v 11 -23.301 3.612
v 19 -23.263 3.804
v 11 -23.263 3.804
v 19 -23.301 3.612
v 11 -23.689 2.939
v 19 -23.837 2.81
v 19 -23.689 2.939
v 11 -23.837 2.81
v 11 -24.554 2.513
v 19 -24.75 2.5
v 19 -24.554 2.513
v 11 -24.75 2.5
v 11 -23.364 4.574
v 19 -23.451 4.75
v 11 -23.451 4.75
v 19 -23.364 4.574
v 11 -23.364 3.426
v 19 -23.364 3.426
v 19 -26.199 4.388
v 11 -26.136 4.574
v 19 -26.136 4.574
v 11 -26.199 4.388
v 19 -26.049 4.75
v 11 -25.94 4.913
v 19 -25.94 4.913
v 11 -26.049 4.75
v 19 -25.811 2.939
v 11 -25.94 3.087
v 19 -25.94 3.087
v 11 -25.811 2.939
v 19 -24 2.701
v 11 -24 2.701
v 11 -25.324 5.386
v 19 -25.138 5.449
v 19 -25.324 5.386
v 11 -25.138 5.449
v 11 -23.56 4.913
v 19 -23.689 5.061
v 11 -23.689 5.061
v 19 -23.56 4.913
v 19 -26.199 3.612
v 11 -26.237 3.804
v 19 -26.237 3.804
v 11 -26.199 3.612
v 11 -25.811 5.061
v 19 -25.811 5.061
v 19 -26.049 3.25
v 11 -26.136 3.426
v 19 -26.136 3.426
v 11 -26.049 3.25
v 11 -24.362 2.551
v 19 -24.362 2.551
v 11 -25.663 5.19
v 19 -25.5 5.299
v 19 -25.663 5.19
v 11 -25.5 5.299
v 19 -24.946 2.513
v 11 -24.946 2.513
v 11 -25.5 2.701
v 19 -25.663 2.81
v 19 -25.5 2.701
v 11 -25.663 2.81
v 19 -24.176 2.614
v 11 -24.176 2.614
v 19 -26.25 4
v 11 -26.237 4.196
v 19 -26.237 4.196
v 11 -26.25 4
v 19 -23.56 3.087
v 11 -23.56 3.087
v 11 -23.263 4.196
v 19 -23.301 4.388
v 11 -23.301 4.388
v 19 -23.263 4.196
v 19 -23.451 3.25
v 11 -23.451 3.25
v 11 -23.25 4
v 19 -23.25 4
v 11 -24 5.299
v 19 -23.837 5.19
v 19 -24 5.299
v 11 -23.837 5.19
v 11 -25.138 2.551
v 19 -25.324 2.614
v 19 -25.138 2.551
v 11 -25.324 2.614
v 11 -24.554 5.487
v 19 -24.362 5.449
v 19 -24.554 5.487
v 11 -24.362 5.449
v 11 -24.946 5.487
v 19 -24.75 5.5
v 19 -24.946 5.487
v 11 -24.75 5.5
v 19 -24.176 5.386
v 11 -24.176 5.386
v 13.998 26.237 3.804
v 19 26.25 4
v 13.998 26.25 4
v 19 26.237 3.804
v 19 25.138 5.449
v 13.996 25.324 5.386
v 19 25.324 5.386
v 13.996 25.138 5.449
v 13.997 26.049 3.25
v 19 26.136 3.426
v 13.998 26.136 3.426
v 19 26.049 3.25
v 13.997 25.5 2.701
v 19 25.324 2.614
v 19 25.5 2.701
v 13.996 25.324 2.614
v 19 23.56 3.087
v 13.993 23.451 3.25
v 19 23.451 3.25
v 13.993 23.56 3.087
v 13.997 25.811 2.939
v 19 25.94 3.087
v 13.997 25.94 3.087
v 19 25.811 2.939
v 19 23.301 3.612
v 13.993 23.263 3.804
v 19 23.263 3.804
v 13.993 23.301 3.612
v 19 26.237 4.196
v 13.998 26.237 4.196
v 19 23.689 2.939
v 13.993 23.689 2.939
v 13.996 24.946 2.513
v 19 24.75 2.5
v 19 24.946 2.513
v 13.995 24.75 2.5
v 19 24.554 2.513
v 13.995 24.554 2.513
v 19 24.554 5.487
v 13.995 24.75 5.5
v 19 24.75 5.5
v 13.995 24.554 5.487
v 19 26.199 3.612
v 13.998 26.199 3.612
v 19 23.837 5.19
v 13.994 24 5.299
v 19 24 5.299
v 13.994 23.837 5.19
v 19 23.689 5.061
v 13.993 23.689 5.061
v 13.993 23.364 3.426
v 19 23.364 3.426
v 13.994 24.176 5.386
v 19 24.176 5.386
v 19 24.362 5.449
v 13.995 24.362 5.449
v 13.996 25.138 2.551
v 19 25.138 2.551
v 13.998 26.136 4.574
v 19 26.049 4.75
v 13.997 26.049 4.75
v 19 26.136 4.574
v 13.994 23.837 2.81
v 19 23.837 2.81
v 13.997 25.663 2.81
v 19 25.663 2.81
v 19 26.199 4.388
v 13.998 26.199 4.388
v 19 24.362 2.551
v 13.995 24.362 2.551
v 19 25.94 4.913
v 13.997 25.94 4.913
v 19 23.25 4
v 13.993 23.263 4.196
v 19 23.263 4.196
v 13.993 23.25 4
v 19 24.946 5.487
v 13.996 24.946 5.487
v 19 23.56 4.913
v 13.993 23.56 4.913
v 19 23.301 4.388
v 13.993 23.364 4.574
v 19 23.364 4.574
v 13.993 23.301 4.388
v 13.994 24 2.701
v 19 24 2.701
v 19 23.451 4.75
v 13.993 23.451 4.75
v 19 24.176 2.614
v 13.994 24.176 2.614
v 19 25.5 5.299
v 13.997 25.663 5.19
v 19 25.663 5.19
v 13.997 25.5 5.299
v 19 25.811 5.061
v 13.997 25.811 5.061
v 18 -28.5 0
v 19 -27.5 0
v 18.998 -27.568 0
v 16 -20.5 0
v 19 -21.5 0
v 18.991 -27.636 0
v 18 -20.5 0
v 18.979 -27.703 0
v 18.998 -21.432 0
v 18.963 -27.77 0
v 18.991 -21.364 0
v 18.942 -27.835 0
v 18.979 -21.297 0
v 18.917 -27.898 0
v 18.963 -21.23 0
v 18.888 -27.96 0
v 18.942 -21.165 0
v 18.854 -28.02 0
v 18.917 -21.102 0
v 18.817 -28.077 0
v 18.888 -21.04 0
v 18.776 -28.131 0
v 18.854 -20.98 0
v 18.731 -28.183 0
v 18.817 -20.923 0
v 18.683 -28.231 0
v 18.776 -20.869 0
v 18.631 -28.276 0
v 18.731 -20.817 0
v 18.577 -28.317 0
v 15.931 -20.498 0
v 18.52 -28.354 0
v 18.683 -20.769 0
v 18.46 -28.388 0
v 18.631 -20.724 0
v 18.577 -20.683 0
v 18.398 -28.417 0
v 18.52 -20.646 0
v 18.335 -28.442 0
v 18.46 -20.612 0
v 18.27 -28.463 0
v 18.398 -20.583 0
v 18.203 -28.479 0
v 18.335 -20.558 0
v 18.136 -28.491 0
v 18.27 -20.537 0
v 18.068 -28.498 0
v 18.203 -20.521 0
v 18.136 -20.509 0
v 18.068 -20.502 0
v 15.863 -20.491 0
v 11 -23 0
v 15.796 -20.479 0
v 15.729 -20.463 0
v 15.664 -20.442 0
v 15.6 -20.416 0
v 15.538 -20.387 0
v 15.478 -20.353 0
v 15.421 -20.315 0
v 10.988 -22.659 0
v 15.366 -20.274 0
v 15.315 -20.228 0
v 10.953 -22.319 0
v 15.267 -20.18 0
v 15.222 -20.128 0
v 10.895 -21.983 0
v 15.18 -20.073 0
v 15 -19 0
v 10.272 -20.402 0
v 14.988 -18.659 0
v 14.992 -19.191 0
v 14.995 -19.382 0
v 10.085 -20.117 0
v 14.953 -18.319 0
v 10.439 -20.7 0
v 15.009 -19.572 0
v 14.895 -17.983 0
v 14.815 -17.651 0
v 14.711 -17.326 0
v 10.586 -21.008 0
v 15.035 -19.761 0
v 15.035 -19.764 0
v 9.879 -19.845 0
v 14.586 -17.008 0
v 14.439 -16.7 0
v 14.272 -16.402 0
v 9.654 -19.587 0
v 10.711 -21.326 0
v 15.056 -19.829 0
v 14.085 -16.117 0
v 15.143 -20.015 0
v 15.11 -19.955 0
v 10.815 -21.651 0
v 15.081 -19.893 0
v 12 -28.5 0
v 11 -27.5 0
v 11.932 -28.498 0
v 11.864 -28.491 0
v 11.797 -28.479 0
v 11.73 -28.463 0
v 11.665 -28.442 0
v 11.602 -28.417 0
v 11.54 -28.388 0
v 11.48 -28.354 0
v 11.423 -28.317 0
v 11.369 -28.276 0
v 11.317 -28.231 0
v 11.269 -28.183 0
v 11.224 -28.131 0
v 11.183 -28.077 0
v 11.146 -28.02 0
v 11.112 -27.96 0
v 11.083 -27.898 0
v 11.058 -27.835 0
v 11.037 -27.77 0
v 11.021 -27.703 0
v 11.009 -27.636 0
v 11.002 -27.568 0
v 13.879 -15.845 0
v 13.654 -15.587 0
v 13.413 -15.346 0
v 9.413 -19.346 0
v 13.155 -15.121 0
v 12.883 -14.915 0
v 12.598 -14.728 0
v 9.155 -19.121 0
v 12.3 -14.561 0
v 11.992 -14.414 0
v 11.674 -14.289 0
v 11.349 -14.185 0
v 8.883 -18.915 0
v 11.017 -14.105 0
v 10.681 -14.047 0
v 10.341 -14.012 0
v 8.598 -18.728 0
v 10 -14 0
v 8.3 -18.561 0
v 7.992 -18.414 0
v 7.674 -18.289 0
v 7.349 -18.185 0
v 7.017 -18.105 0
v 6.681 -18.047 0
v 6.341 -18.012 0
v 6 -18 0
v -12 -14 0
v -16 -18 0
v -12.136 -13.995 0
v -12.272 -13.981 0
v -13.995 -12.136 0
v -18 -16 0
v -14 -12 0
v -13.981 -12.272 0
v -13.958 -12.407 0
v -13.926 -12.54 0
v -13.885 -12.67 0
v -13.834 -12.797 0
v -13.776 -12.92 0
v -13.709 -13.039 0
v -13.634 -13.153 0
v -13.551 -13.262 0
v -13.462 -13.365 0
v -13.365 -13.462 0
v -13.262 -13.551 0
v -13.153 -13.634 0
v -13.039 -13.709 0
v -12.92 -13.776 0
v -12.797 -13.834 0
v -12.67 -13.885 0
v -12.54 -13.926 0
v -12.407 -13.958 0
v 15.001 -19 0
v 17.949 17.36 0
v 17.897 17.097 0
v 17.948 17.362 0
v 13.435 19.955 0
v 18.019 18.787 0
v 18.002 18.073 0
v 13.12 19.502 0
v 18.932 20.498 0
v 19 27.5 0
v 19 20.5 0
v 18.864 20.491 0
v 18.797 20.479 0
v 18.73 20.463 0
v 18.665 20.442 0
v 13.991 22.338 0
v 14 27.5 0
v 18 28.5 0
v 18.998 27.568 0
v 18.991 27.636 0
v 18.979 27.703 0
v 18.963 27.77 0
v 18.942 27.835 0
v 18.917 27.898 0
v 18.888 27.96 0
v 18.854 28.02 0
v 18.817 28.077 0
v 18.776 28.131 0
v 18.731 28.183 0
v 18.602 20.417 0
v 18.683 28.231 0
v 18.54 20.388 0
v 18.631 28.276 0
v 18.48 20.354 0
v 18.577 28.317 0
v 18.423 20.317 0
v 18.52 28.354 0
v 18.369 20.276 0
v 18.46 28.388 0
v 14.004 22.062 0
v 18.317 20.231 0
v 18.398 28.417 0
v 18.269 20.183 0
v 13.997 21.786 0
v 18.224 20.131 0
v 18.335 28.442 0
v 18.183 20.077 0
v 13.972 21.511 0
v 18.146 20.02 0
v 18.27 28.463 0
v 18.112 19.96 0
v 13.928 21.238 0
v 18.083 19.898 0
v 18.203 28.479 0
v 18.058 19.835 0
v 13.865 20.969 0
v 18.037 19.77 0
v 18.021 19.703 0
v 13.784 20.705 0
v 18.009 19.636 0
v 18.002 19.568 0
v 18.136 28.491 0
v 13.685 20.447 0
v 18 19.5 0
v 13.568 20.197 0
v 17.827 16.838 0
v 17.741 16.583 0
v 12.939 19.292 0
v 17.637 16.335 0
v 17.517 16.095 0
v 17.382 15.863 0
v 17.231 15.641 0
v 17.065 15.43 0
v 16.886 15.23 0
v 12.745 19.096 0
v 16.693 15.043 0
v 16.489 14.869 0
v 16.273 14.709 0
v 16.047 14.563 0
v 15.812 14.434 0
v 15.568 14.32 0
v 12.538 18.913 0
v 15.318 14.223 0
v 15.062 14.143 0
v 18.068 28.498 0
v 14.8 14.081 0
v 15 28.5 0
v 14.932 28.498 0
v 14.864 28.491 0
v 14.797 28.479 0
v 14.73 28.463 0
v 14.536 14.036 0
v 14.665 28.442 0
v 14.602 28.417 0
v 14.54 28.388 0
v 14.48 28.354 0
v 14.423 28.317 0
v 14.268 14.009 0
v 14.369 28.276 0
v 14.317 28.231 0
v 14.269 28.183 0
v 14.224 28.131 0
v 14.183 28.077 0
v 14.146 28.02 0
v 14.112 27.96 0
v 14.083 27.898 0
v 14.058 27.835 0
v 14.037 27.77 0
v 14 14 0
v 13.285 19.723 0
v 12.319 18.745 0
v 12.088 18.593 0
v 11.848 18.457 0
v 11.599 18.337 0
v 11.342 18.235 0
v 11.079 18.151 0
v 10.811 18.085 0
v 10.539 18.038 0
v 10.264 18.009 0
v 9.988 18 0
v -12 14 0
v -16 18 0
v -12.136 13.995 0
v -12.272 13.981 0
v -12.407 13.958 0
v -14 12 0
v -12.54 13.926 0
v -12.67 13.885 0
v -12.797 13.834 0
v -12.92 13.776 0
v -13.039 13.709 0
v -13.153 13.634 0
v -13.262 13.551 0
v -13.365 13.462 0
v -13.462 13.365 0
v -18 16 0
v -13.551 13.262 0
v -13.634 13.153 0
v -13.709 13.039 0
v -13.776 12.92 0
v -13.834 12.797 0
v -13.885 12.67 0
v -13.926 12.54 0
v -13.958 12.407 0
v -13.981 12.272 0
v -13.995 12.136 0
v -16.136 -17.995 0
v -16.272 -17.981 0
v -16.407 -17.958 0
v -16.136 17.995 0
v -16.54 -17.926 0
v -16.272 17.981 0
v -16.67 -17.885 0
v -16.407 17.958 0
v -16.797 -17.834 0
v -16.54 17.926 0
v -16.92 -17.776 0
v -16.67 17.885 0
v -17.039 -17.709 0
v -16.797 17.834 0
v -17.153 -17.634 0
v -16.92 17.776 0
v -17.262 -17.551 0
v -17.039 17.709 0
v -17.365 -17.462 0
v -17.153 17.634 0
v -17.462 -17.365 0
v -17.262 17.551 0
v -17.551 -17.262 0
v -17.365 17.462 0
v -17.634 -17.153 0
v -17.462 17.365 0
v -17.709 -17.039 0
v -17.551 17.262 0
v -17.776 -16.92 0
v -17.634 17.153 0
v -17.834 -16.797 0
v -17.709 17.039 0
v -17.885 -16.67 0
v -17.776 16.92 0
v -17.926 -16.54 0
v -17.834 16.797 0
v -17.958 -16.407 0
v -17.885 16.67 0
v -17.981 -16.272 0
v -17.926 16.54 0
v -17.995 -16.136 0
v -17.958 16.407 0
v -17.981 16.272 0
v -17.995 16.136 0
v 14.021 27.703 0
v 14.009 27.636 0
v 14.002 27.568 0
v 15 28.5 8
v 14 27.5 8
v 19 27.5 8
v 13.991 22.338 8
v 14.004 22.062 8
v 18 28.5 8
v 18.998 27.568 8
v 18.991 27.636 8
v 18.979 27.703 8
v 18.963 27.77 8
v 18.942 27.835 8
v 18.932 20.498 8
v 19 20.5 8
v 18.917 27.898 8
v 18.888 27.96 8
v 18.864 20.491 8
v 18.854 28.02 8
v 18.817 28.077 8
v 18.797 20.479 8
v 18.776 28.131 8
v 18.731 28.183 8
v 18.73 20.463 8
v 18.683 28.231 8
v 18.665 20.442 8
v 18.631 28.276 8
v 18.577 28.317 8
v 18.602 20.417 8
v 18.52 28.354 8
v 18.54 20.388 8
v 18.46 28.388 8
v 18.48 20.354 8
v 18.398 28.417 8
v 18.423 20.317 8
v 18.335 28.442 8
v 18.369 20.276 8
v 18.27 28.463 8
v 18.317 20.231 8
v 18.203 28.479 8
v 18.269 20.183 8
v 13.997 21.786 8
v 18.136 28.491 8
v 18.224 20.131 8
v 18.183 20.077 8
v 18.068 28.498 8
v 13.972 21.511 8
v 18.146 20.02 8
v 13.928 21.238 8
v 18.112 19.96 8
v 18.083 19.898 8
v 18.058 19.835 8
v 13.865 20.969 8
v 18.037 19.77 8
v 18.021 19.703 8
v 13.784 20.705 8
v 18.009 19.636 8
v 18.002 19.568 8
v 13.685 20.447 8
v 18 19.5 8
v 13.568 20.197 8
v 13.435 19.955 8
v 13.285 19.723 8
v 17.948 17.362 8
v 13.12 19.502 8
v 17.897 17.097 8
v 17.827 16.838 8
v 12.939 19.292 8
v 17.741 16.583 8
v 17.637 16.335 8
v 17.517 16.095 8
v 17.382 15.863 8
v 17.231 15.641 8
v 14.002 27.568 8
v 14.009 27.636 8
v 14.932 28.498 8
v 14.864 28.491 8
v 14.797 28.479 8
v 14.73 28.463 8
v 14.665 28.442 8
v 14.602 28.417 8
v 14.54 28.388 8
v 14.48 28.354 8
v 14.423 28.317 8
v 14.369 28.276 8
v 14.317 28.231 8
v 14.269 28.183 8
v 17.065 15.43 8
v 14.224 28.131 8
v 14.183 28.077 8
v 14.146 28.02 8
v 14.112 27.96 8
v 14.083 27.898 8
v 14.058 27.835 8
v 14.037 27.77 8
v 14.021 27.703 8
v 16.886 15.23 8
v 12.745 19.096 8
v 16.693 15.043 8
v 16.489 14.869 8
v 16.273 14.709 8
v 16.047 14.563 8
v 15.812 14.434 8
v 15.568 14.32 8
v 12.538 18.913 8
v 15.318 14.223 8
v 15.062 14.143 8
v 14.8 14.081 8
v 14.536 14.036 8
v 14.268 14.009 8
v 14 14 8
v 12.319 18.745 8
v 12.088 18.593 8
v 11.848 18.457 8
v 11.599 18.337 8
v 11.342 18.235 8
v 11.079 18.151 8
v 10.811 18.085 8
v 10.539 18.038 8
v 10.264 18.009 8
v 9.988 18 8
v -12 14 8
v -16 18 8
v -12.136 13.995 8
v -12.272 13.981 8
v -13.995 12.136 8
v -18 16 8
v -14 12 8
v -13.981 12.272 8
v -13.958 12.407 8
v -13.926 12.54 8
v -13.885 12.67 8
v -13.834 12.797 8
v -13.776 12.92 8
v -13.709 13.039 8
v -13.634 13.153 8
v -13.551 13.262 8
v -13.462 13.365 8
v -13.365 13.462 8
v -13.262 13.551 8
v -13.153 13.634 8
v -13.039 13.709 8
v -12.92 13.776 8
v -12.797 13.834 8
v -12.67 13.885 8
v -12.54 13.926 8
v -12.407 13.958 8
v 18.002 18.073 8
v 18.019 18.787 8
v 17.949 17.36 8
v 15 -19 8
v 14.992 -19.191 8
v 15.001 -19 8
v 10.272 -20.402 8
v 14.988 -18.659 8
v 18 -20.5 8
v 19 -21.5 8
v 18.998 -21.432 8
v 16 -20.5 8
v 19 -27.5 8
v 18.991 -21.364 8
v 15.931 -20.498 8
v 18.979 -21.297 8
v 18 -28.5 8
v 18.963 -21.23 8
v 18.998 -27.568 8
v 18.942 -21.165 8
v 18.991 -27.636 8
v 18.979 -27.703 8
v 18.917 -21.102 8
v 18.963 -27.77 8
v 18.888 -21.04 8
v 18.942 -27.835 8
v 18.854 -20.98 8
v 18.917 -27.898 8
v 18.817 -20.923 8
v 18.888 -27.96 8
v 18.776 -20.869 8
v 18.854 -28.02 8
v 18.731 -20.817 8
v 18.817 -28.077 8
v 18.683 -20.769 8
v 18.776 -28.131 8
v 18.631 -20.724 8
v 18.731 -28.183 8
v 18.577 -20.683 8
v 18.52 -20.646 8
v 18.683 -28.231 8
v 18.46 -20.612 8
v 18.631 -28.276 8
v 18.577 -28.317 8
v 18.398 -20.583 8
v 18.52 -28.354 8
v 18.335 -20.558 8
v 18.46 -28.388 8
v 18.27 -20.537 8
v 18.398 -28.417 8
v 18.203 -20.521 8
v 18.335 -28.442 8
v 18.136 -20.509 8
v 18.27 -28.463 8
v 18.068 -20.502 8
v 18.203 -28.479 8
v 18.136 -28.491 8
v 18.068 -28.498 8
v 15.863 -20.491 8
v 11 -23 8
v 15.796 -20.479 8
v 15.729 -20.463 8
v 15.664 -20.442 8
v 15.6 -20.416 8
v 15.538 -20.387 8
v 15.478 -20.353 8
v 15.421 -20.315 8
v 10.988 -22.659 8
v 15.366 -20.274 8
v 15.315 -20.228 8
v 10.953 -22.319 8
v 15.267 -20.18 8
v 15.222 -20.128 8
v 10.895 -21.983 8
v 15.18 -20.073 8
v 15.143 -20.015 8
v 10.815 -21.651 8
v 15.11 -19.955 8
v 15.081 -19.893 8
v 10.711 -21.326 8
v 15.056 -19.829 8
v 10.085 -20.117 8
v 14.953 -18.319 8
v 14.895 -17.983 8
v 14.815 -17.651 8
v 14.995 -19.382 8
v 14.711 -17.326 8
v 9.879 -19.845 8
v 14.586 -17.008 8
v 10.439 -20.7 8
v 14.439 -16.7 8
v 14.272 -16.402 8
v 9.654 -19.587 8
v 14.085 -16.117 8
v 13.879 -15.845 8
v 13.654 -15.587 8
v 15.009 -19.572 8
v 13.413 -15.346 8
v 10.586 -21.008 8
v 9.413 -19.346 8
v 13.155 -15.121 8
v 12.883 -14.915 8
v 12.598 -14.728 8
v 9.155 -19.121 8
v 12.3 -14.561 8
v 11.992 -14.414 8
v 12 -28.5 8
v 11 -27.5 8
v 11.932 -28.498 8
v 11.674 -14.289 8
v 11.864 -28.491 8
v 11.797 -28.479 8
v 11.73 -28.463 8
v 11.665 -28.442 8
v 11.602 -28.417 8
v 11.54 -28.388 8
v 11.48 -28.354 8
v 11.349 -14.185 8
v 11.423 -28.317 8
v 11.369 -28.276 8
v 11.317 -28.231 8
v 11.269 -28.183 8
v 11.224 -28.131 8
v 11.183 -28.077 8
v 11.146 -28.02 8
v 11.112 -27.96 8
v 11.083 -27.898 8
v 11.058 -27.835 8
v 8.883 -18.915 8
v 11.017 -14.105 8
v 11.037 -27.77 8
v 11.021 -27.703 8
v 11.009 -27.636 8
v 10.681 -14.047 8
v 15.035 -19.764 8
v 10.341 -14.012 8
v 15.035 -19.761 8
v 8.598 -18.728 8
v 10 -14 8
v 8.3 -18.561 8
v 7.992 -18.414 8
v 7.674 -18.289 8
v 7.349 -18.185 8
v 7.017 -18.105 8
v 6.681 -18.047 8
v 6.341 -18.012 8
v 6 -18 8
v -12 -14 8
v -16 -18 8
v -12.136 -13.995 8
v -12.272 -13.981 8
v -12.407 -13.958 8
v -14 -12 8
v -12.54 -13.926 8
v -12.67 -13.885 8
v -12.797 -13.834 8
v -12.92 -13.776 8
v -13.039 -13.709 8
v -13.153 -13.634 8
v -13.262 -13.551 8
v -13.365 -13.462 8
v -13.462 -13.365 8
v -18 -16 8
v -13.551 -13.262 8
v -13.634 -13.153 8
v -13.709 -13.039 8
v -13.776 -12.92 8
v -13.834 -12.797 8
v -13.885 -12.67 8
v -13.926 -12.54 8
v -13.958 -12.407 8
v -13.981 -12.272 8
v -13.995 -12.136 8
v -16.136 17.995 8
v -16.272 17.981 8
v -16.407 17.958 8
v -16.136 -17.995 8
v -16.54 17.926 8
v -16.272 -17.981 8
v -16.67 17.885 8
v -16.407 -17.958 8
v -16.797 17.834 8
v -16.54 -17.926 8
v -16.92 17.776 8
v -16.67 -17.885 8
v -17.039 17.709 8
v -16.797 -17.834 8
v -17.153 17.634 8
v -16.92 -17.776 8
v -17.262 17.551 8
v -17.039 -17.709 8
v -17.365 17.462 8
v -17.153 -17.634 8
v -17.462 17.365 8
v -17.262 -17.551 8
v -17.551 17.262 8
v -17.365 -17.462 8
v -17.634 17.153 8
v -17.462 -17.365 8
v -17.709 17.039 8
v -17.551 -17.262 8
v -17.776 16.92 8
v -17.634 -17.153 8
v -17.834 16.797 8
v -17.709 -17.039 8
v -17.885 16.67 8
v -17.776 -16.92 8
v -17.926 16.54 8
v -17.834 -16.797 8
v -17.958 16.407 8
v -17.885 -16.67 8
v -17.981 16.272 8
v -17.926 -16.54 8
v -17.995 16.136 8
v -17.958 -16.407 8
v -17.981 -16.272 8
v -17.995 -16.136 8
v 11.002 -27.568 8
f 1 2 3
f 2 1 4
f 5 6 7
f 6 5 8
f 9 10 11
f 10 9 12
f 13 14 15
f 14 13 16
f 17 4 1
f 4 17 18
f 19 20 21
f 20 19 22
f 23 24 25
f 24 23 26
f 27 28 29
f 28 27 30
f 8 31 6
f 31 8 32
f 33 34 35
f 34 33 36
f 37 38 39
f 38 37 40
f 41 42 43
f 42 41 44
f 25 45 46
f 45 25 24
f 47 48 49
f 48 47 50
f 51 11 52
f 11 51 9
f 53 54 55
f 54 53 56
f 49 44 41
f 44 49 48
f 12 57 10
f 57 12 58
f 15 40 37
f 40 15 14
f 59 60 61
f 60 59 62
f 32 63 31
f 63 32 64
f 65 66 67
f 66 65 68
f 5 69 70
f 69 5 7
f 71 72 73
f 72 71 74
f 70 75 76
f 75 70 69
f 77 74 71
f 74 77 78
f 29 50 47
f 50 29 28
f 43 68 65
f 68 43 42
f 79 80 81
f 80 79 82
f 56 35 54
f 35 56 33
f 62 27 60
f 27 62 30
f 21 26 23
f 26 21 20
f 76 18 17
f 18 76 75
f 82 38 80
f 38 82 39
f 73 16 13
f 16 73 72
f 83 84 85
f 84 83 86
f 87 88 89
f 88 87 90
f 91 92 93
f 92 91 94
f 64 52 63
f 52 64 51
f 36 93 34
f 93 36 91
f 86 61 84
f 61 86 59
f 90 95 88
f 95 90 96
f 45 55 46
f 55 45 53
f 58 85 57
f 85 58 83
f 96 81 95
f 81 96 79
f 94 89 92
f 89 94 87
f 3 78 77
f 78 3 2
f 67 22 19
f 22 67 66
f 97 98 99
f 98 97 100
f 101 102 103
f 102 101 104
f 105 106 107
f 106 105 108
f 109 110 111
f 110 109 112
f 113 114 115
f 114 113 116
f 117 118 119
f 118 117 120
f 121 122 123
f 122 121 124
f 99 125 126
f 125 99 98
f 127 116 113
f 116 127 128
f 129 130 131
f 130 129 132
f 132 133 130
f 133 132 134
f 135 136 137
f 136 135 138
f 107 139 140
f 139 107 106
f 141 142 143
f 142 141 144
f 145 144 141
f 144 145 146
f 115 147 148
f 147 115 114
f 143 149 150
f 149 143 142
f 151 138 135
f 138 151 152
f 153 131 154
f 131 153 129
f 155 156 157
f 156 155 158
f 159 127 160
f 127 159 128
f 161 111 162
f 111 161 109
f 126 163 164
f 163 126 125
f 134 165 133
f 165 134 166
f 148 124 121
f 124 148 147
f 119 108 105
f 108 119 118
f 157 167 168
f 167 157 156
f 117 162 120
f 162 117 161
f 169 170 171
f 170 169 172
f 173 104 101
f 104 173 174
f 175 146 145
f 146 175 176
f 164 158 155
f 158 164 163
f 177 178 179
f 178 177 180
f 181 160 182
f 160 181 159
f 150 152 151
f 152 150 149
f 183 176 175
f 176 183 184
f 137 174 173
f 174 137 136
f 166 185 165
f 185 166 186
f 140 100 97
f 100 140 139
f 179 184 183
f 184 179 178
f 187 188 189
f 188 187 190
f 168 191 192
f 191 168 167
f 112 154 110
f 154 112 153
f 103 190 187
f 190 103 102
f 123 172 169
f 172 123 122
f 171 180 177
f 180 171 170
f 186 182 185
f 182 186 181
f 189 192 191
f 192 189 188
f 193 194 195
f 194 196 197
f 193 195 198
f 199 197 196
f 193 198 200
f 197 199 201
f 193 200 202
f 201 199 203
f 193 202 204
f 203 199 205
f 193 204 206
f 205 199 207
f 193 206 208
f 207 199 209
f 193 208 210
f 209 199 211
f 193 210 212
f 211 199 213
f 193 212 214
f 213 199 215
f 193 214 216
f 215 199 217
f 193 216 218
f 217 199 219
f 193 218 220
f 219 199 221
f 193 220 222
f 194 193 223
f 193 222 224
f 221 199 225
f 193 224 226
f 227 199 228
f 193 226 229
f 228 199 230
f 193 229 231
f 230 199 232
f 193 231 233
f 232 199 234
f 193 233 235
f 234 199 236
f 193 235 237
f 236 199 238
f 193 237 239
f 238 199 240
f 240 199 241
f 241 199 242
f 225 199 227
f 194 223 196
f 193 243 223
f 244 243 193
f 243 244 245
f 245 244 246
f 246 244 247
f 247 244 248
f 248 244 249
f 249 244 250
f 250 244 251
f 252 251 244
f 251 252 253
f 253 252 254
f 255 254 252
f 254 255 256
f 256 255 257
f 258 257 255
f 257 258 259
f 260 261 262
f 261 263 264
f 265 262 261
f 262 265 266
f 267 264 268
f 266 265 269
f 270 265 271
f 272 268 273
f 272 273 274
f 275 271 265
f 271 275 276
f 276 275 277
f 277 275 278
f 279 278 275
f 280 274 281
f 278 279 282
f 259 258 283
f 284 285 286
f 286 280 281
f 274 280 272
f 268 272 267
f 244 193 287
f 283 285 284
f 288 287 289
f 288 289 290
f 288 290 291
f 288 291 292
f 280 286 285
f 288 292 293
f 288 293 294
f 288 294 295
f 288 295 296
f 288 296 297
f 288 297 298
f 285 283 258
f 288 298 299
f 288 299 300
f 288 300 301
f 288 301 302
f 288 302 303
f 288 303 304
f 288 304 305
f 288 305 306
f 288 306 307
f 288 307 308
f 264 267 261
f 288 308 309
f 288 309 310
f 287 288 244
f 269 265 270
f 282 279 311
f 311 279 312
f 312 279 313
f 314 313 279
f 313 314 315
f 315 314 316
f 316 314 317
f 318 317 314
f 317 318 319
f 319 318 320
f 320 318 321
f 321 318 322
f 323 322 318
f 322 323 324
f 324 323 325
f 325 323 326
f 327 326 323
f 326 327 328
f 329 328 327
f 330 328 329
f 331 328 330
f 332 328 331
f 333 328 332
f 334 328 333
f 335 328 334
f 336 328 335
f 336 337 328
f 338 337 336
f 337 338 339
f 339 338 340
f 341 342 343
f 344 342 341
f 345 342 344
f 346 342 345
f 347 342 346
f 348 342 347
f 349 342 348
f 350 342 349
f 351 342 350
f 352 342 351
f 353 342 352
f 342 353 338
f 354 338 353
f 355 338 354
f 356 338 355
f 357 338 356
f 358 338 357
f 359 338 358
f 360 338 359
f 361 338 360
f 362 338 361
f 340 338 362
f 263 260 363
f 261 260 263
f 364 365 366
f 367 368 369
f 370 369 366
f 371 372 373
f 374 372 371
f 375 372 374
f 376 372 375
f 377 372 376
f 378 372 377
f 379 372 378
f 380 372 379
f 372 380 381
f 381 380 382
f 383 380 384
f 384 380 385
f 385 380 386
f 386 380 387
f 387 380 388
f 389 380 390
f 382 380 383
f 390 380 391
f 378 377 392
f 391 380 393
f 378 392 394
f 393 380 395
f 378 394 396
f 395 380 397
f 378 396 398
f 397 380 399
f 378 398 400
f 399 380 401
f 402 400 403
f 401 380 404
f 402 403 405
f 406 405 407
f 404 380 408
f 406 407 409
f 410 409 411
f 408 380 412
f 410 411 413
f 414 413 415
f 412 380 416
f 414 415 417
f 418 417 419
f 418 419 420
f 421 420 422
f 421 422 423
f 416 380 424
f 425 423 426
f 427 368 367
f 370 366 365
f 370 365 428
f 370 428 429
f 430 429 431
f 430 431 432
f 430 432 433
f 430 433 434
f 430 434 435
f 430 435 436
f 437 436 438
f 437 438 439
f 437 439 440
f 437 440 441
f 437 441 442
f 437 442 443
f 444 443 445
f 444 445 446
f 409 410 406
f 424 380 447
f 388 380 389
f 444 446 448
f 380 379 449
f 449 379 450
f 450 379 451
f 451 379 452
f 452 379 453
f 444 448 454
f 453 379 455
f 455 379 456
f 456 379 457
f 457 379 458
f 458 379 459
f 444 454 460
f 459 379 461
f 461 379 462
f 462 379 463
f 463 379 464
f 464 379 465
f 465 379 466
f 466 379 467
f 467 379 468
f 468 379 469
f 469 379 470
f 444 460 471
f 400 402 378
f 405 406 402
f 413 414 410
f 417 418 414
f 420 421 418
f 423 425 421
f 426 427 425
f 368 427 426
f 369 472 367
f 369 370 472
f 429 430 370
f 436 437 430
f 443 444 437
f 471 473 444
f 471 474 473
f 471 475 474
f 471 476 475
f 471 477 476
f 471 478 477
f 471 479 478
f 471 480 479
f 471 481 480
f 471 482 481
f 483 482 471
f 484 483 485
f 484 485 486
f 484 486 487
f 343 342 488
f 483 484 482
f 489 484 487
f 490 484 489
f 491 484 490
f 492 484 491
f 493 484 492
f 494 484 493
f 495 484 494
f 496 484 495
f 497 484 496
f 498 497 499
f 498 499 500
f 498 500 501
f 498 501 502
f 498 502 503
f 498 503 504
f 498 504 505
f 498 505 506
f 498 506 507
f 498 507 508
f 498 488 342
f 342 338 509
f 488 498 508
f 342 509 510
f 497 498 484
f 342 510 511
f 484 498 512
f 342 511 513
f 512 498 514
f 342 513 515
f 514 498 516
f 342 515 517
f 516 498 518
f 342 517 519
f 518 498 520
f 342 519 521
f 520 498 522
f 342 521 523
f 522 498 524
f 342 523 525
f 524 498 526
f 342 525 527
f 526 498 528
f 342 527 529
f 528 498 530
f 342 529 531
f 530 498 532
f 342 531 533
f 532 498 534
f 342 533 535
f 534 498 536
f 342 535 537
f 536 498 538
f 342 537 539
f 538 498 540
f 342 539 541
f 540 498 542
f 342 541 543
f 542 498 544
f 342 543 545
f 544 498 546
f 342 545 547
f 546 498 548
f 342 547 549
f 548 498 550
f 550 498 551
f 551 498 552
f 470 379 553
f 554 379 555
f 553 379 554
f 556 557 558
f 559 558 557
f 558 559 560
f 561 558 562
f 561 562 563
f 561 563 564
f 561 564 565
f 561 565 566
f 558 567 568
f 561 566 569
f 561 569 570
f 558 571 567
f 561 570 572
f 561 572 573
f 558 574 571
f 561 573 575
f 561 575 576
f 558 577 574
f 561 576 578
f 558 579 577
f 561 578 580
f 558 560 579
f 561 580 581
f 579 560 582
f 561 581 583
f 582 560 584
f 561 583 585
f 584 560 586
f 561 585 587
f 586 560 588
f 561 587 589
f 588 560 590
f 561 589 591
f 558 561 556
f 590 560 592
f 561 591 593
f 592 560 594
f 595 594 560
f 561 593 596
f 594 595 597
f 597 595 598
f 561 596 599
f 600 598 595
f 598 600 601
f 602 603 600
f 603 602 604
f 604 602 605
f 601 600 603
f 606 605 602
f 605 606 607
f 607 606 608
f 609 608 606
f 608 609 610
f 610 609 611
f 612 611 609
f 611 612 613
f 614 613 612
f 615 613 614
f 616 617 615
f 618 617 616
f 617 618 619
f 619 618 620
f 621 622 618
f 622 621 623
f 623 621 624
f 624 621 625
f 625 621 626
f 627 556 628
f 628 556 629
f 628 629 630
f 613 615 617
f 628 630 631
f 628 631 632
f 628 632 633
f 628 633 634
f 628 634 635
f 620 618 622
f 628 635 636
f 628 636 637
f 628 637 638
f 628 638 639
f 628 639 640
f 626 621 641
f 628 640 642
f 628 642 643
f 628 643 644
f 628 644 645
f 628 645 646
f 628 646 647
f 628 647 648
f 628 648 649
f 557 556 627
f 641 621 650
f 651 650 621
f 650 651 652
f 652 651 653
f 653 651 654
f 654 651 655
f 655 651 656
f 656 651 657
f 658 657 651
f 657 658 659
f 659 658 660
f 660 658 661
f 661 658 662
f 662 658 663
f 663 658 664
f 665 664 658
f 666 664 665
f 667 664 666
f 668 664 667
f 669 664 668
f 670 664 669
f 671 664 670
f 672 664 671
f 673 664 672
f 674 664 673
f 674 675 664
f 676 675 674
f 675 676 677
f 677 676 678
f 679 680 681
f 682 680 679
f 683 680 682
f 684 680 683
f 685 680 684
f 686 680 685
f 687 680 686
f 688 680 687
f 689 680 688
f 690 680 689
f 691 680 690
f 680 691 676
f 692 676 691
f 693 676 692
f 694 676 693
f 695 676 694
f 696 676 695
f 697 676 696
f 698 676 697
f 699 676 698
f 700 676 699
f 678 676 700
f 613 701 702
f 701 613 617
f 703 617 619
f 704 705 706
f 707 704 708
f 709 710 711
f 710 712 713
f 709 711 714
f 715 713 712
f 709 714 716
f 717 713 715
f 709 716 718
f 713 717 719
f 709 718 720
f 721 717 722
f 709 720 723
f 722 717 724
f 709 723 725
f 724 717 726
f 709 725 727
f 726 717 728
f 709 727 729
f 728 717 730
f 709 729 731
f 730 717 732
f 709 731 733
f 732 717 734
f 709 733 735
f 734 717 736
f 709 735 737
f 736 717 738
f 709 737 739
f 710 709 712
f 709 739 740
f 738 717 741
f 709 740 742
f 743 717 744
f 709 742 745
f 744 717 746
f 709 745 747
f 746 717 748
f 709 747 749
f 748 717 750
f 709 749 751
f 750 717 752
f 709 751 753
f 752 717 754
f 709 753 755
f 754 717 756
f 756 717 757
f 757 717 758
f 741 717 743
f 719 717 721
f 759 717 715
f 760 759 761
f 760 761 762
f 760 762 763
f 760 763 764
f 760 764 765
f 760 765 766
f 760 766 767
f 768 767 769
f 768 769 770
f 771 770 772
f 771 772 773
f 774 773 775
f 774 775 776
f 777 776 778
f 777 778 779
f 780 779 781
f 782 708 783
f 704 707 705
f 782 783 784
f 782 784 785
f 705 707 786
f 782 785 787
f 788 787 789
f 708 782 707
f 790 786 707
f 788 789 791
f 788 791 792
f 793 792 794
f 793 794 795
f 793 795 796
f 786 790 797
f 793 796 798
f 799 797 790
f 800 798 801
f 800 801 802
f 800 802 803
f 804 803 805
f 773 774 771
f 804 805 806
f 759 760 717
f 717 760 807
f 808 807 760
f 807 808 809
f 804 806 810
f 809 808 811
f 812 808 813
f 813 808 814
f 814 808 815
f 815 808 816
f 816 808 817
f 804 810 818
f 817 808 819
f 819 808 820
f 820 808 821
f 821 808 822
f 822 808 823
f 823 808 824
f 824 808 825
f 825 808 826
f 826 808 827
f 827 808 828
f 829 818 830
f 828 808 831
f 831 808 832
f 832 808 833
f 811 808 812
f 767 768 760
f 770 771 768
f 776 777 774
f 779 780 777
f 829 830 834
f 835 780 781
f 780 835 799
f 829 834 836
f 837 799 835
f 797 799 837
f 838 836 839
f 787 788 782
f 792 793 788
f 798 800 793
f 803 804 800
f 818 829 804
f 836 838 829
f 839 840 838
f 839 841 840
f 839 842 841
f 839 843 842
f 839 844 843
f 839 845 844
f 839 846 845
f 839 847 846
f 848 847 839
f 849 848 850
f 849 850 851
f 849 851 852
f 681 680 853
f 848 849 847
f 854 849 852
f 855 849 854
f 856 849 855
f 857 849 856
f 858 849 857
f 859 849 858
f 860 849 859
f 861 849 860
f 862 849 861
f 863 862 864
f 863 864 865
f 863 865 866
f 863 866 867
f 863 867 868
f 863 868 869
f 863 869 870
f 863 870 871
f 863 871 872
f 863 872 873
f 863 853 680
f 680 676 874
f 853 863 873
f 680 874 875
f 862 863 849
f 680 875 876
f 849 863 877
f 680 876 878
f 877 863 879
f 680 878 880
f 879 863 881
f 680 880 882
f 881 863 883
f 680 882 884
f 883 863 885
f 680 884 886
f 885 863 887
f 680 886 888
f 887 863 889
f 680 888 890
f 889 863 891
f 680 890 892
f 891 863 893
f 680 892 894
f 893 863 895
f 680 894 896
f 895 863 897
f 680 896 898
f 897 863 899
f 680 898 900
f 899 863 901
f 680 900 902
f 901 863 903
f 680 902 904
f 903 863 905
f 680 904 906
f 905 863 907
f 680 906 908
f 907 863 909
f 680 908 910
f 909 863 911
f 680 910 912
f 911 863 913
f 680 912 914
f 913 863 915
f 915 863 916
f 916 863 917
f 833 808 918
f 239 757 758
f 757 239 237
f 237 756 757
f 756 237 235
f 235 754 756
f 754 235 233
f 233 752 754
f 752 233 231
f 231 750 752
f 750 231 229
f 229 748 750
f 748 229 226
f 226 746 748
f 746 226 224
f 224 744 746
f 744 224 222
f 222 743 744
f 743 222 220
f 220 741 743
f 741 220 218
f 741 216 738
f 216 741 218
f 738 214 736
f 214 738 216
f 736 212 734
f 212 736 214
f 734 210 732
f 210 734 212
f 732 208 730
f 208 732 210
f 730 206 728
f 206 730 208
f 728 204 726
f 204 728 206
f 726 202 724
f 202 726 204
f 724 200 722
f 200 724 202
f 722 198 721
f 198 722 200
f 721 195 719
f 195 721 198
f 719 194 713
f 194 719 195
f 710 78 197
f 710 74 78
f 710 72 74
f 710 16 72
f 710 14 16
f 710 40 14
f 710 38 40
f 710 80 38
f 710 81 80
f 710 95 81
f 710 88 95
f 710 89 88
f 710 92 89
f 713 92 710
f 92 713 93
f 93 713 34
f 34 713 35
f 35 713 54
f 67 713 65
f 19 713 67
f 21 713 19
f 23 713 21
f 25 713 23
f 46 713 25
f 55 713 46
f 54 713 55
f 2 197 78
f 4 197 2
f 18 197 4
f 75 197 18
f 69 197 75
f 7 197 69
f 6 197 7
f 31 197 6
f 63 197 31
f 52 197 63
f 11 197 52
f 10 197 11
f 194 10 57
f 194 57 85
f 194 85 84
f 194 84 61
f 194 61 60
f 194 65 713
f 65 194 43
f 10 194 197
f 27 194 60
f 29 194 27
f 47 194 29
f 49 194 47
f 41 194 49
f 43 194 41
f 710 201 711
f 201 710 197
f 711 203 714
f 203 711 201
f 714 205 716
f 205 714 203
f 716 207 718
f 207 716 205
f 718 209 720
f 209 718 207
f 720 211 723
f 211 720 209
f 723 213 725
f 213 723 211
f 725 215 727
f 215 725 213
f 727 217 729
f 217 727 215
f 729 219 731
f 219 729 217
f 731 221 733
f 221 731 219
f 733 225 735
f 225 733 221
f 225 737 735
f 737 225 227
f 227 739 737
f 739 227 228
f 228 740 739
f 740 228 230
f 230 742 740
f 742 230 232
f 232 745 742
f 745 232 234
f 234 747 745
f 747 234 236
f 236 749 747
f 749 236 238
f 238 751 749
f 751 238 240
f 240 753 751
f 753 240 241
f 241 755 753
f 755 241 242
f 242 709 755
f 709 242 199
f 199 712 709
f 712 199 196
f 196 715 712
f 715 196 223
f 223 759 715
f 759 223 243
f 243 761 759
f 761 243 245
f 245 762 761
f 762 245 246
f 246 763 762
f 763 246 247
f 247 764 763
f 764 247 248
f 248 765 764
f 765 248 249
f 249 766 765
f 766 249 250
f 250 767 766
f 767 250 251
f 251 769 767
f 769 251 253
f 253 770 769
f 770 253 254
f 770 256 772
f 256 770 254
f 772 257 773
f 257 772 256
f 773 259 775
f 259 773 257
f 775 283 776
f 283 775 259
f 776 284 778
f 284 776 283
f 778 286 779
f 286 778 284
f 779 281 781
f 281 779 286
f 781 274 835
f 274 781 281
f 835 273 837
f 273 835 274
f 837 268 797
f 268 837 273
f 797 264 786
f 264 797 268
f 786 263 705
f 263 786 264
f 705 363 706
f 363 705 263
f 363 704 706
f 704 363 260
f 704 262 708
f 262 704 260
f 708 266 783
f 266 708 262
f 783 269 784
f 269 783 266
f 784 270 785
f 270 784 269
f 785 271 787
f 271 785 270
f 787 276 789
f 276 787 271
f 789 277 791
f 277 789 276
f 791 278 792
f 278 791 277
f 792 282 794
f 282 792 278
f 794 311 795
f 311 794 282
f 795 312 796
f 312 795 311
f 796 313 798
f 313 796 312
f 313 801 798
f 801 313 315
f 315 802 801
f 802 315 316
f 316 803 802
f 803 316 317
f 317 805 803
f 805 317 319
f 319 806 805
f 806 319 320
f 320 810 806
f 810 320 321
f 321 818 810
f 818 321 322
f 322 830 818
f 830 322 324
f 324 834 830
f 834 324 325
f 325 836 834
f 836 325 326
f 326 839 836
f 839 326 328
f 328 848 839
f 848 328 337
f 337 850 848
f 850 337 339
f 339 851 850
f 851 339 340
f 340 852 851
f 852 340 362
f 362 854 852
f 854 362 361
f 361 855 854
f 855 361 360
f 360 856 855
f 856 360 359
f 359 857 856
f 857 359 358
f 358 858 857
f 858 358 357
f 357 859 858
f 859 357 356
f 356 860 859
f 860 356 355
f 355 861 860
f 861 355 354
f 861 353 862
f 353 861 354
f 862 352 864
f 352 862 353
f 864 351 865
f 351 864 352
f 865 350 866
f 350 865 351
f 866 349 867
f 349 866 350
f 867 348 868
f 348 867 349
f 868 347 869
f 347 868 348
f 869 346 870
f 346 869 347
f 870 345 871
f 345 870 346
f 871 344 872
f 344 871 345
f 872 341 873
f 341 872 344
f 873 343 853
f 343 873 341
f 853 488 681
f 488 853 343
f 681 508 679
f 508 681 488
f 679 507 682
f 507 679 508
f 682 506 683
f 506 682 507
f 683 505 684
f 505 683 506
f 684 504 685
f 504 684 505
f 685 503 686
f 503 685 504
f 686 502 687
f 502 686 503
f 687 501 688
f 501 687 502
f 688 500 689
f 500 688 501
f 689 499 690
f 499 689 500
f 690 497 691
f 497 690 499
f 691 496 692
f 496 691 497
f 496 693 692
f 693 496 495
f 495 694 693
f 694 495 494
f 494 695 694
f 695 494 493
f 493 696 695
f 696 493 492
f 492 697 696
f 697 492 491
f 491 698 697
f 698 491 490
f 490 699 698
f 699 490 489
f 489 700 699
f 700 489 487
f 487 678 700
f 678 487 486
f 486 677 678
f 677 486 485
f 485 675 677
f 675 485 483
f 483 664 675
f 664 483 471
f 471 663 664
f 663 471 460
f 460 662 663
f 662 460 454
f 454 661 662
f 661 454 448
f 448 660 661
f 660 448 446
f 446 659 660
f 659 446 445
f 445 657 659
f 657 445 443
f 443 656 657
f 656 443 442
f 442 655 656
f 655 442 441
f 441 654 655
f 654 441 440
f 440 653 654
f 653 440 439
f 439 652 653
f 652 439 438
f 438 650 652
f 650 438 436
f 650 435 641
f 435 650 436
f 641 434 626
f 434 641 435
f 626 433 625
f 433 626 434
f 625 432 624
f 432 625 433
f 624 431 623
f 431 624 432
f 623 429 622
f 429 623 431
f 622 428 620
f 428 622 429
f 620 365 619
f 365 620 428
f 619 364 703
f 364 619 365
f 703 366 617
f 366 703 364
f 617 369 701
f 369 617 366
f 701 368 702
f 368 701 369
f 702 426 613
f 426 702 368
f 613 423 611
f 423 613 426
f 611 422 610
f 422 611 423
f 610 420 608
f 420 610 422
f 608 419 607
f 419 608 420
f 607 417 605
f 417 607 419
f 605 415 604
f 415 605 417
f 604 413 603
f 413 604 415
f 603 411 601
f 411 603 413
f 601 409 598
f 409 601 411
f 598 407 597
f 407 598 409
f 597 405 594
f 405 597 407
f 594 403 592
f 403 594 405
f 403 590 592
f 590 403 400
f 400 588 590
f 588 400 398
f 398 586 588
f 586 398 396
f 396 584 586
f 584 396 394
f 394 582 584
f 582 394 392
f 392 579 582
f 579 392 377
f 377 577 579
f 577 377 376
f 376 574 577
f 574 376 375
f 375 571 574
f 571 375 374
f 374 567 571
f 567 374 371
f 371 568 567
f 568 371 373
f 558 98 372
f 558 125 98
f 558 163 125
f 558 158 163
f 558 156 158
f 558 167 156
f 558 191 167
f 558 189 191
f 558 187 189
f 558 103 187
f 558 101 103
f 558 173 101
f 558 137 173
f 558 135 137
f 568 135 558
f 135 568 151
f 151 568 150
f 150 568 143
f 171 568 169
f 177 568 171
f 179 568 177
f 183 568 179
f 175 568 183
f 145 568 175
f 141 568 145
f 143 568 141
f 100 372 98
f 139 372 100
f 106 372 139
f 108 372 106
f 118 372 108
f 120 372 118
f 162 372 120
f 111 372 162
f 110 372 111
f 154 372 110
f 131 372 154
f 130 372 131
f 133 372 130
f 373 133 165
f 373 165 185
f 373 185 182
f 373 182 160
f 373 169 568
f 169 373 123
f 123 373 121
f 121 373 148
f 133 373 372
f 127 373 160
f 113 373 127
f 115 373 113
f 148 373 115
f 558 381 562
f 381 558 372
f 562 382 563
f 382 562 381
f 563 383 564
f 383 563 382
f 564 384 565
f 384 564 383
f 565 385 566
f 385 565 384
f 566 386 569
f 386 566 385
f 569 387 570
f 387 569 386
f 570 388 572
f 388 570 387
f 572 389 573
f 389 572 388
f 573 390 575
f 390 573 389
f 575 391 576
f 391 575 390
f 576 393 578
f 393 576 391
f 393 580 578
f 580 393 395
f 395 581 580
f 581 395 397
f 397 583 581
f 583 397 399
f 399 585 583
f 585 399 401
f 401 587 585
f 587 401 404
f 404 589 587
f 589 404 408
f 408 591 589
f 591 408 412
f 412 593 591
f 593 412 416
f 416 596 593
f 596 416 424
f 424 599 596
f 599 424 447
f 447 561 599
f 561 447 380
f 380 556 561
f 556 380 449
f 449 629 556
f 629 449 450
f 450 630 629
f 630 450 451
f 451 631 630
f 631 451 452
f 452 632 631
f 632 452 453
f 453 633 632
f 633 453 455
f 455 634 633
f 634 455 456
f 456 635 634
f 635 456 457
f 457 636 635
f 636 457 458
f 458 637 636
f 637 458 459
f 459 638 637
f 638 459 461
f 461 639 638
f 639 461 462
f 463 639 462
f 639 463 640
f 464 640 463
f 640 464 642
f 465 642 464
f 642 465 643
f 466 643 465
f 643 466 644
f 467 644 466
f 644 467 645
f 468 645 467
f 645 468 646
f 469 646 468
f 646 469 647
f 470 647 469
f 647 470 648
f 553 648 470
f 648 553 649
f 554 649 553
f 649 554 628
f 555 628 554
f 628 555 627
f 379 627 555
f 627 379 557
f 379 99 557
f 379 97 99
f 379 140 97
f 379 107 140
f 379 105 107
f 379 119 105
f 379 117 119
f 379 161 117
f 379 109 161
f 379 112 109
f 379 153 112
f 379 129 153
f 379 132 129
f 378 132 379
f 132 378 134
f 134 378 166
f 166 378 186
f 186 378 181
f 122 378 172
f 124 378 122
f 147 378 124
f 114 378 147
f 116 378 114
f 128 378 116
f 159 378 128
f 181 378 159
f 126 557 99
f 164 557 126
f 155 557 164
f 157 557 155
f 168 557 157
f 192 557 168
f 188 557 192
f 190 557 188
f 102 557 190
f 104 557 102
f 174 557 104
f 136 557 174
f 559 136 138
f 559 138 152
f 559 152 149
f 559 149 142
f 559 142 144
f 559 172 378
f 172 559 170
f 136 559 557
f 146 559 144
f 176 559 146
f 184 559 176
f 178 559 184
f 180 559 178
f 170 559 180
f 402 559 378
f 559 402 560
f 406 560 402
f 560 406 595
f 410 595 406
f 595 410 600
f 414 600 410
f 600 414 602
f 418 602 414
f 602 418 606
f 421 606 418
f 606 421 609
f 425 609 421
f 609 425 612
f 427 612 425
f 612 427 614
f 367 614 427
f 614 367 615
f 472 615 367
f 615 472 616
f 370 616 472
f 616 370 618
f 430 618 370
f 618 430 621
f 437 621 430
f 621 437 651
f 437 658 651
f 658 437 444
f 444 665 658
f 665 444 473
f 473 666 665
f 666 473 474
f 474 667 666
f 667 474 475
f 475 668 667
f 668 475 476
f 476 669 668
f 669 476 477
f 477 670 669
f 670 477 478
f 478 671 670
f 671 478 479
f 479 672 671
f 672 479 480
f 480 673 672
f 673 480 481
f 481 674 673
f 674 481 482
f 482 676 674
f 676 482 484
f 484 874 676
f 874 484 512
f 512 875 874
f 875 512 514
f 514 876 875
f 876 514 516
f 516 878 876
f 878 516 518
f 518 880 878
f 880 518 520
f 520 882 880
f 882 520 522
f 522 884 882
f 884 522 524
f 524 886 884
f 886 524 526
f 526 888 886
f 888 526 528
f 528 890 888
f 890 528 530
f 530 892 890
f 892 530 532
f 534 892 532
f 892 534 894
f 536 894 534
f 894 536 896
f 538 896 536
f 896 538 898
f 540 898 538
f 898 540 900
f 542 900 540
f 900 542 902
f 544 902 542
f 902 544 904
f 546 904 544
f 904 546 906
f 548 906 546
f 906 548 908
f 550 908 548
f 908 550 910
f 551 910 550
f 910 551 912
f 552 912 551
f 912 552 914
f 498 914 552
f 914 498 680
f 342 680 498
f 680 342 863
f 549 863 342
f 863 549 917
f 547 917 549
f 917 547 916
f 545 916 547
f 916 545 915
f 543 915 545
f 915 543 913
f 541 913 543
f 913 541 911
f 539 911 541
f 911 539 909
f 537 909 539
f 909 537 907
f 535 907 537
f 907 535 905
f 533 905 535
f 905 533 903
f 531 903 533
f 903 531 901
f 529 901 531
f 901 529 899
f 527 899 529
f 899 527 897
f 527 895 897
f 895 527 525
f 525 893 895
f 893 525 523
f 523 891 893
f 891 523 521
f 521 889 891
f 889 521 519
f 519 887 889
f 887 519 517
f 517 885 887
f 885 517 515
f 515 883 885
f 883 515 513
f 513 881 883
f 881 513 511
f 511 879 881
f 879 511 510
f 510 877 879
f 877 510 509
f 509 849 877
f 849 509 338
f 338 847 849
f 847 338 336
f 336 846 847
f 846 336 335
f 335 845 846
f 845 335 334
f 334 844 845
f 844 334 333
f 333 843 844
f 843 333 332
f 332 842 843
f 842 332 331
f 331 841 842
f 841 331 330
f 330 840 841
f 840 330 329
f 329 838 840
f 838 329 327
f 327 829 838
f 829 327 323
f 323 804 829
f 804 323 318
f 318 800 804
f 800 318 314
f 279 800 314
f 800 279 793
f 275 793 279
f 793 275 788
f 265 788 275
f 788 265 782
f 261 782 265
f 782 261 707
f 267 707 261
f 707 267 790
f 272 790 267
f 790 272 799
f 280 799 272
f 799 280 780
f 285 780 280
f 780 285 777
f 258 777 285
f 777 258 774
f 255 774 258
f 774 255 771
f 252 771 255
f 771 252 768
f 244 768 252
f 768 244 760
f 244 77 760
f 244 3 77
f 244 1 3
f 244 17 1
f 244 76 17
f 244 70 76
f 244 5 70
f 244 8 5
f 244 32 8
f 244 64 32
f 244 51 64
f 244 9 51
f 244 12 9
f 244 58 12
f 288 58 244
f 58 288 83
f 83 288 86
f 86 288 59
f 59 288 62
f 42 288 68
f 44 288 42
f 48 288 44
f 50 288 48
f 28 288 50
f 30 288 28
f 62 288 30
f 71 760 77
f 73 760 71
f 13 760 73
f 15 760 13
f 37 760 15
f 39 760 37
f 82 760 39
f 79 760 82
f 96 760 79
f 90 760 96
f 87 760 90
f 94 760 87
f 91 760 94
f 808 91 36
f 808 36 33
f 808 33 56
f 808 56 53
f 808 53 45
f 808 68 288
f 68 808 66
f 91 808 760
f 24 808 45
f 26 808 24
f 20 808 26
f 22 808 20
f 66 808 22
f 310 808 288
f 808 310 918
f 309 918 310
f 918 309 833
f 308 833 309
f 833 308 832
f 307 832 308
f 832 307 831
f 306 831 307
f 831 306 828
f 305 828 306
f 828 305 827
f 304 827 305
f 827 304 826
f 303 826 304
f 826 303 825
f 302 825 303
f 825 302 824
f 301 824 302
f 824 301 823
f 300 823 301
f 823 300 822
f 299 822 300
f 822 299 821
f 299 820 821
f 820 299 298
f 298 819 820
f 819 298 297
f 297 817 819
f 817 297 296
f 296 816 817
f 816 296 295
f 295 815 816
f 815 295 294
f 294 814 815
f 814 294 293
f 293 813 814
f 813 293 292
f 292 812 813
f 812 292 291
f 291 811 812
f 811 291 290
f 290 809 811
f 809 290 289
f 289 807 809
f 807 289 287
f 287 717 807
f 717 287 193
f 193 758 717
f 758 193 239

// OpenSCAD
// file: ../print_fit.scad
// Print-fit clearances, shared by every printed part's `config="revised"`.
//
// A printed part comes off the machine slightly oversize, so a feature drawn
// line-to-line against what it mates with will not go together. Each mating
// feature is drawn at its mate's nominal size plus or minus one of two
// clearances, per side, chosen by what the mate is:
//
//     FIT_PRESS    a bought part the printed one is seated on, located by
//                  or bonded to: bearings, motors, splines, CF rods, tubes
//                  and strakes
//     FIT_SLIP     another printed part, and every fastener's clearance:
//                  screw holes, nut traps and pockets
//
// A third class is not a fit, because its surfaces never meet:
//
//     FIT_RUN      a gap between two parts that turn past each other and
//                  must never touch, such as a housing and a gear's teeth
//
// The classes, their members and exclusions, and how a machine is qualified
// against these values are owned by specs/007.2 § Print fits; the coupon that
// qualifies them is 950-Tooling/fit_coupon.scad.
//
// Every part `include`s this file, so `-D FIT_SLIP=...` reaches a single
// render, and an edit here retunes every part. `config="previous"` draws at
// zero clearance: it is the reference mesh, and its dist gate measures it.

FIT_SLIP  = 0.15;
FIT_PRESS = 0.05;
FIT_RUN   = 0.50;

// A hole or bore that takes a mate of diameter d, and a pin or shaft that
// goes into one, with clearance c per side.
function fit_bore(d, c) = d + 2 * c;
function fit_pin(d, c) = d - 2 * c;

// The clearances a part draws in configuration cfg: [slip, press, run].
function fit_clearances(cfg) =
    cfg == "previous" ? [0, 0, 0] : [FIT_SLIP, FIT_PRESS, FIT_RUN];
// main file
// #800-006 PCB Bracket — parametric source.
// Two per robot. Each is epoxied to the C-504 1 inch (25.4) square carbon fibre
// tube; the Motor Control Board bolts to its end blocks with M3 x 20 bolts
// through the PCB spacers (008.10 steps 4 to 6).
//
//   config = "previous" — faithful recreation of the reference mesh
//                         (../Reference/meshes/800-Harness/).
//   config = "revised"  — the same geometry: it draws no print fit.
//
// FRAME. The reference's own: the opening's centre on the origin, the arms
// reaching out along +x, z 0 .. 8.
//
// Measured from the reference (scadmesh arcs at z = 1, the owner of the
// outline; slice along x for the holes). The feature IDs are those of
// 800-006_PCBBracket.view.json, which labels each one on the mesh:
//
//     ID  feature                    value                          z span
//     O1  outline, one plan profile  ring x -18 .. 18, y -18 .. 18, R2
//                                    corners; arms out to x 18 .. 19  0 .. 8
//     W1  opening for the tube       x -14 .. 14, y -14 .. 14, R2 corners
//                                    (open on +x between the arms)    0 .. 8
//     E1  end block, -y              x 11 .. 19, y -28.5 .. -20.5, R1 outer
//                                    corners, R5 blend into the ring
//     E2  end block, +y              x 14 .. 19, y 20.5 .. 28.5, R1 outer
//                                    corners, R4 blend into the ring
//     H1  bolt holes, along x        Ø3.0 at y = +-24.75, z = 4.0,
//                                    through each block
//
// The inner flanks of the arms are R1 at the blocks, an R3.2 and R1 blend
// on the -y side, and an R4 corner on the +y side; the arcs below are the
// arcs scadmesh read, in order round the outline.
//
// CONSTRUCTION. The plan profile, drawn whole as one polygon of lines and arcs,
// extruded 8.0; the H1 cutters, which lie off the layer plane, cut across the
// blocks. `layer = "plate"` draws the profile in 2D, for verification against
// the mesh's section (scadmesh outline).
//
// FITS (../print_fit.scad): none drawn. The 28 x 28 opening clears the 25.4
// tube by 1.3 per side because the tube is bonded, wider than the press fit,
// so it keeps its size. H1 is threaded by its M3 bolt, not a clearance, and
// keeps its size.

include <../print_fit.scad>

/* [Configuration] */
// Parameter set: previous (reference) or revised
config = "previous"; // [previous, revised]
// What to draw: the part, or its plan profile
layer = "part"; // [part, plate]

/* [Hidden] */
$fn = 48;

HEIGHT   = 8.0;
HOLE_D   = 3.0;                  // H1; threaded by the M3 bolt
HOLE_Y   = 24.75;
HOLE_Z   = 4.0;
HOLE_X   = [9, 20];              // the cutter's span, past both faces of the blocks

// Points of the arc about c, radius r, from angle a0 to a1 (degrees), ends included.
function arc(c, r, a0, a1) =
    let (n = max(3, ceil(abs(a1 - a0) / 4)))
    [for (i = [0 : n]) let (a = a0 + (a1 - a0) * i / n) c + r * [cos(a), sin(a)]];

// [centre, radius, from, to] for each arc, in order clockwise round the outline.
ARCS = [
    [[12, -27.5], 1, -90, -180],             // E1 outer corner
    [[6, -23], 5, 0, 90],                    // E1 blend into the ring
    [[-16, -16], 2, -90, -180],              // ring corner
    [[-16, 16], 2, 180, 90],                 // ring corner
    [[9.988, 22.016], 4.016, -90, 4.6],      // E2 blend into the ring
    [[15, 27.5], 1, 180, 90],                // E2 outer corner
    [[18, 27.5], 1, 90, 0],                  // E2 outer corner
    [[19, 19.5], 1, 90, 180],                // E2 inner corner
    [[4.055, 18.763], 13.964, 3.025, -5.76], // arm's end face
    [[14, 18], 4, -9.2, -90],                // opening's +y corner
    [[-12, 12], 2, 90, 180],                 // opening corner
    [[-12, -12], 2, 180, 270],               // opening corner
    [[10, -19], 5, 90, 0],                   // opening's -y blend
    [[18.196, -19.238], 3.204, 175.74, 189.4],
    [[16, -19.5], 1, 195.3, 270],
    [[18, -21.5], 1, 90, 0],                 // E1 inner corner
    [[18, -27.5], 1, 0, -90]                 // E1 outer corner
];

function profile_points() = [for (a = ARCS) each arc(a[0], a[1], a[2], a[3])];

module profile_2d() polygon(profile_points());

// One bolt hole, across a block along x.
module bolt_hole(y)
    translate([HOLE_X[0], y, HOLE_Z]) rotate([0, 90, 0])
        cylinder(d = HOLE_D, h = HOLE_X[1] - HOLE_X[0]);

module pcb_bracket()
    difference() {
        linear_extrude(HEIGHT) profile_2d();
        for (s = [-1, 1]) bolt_hole(s * HOLE_Y);
    }

if (layer == "plate") profile_2d();
else pcb_bracket();
